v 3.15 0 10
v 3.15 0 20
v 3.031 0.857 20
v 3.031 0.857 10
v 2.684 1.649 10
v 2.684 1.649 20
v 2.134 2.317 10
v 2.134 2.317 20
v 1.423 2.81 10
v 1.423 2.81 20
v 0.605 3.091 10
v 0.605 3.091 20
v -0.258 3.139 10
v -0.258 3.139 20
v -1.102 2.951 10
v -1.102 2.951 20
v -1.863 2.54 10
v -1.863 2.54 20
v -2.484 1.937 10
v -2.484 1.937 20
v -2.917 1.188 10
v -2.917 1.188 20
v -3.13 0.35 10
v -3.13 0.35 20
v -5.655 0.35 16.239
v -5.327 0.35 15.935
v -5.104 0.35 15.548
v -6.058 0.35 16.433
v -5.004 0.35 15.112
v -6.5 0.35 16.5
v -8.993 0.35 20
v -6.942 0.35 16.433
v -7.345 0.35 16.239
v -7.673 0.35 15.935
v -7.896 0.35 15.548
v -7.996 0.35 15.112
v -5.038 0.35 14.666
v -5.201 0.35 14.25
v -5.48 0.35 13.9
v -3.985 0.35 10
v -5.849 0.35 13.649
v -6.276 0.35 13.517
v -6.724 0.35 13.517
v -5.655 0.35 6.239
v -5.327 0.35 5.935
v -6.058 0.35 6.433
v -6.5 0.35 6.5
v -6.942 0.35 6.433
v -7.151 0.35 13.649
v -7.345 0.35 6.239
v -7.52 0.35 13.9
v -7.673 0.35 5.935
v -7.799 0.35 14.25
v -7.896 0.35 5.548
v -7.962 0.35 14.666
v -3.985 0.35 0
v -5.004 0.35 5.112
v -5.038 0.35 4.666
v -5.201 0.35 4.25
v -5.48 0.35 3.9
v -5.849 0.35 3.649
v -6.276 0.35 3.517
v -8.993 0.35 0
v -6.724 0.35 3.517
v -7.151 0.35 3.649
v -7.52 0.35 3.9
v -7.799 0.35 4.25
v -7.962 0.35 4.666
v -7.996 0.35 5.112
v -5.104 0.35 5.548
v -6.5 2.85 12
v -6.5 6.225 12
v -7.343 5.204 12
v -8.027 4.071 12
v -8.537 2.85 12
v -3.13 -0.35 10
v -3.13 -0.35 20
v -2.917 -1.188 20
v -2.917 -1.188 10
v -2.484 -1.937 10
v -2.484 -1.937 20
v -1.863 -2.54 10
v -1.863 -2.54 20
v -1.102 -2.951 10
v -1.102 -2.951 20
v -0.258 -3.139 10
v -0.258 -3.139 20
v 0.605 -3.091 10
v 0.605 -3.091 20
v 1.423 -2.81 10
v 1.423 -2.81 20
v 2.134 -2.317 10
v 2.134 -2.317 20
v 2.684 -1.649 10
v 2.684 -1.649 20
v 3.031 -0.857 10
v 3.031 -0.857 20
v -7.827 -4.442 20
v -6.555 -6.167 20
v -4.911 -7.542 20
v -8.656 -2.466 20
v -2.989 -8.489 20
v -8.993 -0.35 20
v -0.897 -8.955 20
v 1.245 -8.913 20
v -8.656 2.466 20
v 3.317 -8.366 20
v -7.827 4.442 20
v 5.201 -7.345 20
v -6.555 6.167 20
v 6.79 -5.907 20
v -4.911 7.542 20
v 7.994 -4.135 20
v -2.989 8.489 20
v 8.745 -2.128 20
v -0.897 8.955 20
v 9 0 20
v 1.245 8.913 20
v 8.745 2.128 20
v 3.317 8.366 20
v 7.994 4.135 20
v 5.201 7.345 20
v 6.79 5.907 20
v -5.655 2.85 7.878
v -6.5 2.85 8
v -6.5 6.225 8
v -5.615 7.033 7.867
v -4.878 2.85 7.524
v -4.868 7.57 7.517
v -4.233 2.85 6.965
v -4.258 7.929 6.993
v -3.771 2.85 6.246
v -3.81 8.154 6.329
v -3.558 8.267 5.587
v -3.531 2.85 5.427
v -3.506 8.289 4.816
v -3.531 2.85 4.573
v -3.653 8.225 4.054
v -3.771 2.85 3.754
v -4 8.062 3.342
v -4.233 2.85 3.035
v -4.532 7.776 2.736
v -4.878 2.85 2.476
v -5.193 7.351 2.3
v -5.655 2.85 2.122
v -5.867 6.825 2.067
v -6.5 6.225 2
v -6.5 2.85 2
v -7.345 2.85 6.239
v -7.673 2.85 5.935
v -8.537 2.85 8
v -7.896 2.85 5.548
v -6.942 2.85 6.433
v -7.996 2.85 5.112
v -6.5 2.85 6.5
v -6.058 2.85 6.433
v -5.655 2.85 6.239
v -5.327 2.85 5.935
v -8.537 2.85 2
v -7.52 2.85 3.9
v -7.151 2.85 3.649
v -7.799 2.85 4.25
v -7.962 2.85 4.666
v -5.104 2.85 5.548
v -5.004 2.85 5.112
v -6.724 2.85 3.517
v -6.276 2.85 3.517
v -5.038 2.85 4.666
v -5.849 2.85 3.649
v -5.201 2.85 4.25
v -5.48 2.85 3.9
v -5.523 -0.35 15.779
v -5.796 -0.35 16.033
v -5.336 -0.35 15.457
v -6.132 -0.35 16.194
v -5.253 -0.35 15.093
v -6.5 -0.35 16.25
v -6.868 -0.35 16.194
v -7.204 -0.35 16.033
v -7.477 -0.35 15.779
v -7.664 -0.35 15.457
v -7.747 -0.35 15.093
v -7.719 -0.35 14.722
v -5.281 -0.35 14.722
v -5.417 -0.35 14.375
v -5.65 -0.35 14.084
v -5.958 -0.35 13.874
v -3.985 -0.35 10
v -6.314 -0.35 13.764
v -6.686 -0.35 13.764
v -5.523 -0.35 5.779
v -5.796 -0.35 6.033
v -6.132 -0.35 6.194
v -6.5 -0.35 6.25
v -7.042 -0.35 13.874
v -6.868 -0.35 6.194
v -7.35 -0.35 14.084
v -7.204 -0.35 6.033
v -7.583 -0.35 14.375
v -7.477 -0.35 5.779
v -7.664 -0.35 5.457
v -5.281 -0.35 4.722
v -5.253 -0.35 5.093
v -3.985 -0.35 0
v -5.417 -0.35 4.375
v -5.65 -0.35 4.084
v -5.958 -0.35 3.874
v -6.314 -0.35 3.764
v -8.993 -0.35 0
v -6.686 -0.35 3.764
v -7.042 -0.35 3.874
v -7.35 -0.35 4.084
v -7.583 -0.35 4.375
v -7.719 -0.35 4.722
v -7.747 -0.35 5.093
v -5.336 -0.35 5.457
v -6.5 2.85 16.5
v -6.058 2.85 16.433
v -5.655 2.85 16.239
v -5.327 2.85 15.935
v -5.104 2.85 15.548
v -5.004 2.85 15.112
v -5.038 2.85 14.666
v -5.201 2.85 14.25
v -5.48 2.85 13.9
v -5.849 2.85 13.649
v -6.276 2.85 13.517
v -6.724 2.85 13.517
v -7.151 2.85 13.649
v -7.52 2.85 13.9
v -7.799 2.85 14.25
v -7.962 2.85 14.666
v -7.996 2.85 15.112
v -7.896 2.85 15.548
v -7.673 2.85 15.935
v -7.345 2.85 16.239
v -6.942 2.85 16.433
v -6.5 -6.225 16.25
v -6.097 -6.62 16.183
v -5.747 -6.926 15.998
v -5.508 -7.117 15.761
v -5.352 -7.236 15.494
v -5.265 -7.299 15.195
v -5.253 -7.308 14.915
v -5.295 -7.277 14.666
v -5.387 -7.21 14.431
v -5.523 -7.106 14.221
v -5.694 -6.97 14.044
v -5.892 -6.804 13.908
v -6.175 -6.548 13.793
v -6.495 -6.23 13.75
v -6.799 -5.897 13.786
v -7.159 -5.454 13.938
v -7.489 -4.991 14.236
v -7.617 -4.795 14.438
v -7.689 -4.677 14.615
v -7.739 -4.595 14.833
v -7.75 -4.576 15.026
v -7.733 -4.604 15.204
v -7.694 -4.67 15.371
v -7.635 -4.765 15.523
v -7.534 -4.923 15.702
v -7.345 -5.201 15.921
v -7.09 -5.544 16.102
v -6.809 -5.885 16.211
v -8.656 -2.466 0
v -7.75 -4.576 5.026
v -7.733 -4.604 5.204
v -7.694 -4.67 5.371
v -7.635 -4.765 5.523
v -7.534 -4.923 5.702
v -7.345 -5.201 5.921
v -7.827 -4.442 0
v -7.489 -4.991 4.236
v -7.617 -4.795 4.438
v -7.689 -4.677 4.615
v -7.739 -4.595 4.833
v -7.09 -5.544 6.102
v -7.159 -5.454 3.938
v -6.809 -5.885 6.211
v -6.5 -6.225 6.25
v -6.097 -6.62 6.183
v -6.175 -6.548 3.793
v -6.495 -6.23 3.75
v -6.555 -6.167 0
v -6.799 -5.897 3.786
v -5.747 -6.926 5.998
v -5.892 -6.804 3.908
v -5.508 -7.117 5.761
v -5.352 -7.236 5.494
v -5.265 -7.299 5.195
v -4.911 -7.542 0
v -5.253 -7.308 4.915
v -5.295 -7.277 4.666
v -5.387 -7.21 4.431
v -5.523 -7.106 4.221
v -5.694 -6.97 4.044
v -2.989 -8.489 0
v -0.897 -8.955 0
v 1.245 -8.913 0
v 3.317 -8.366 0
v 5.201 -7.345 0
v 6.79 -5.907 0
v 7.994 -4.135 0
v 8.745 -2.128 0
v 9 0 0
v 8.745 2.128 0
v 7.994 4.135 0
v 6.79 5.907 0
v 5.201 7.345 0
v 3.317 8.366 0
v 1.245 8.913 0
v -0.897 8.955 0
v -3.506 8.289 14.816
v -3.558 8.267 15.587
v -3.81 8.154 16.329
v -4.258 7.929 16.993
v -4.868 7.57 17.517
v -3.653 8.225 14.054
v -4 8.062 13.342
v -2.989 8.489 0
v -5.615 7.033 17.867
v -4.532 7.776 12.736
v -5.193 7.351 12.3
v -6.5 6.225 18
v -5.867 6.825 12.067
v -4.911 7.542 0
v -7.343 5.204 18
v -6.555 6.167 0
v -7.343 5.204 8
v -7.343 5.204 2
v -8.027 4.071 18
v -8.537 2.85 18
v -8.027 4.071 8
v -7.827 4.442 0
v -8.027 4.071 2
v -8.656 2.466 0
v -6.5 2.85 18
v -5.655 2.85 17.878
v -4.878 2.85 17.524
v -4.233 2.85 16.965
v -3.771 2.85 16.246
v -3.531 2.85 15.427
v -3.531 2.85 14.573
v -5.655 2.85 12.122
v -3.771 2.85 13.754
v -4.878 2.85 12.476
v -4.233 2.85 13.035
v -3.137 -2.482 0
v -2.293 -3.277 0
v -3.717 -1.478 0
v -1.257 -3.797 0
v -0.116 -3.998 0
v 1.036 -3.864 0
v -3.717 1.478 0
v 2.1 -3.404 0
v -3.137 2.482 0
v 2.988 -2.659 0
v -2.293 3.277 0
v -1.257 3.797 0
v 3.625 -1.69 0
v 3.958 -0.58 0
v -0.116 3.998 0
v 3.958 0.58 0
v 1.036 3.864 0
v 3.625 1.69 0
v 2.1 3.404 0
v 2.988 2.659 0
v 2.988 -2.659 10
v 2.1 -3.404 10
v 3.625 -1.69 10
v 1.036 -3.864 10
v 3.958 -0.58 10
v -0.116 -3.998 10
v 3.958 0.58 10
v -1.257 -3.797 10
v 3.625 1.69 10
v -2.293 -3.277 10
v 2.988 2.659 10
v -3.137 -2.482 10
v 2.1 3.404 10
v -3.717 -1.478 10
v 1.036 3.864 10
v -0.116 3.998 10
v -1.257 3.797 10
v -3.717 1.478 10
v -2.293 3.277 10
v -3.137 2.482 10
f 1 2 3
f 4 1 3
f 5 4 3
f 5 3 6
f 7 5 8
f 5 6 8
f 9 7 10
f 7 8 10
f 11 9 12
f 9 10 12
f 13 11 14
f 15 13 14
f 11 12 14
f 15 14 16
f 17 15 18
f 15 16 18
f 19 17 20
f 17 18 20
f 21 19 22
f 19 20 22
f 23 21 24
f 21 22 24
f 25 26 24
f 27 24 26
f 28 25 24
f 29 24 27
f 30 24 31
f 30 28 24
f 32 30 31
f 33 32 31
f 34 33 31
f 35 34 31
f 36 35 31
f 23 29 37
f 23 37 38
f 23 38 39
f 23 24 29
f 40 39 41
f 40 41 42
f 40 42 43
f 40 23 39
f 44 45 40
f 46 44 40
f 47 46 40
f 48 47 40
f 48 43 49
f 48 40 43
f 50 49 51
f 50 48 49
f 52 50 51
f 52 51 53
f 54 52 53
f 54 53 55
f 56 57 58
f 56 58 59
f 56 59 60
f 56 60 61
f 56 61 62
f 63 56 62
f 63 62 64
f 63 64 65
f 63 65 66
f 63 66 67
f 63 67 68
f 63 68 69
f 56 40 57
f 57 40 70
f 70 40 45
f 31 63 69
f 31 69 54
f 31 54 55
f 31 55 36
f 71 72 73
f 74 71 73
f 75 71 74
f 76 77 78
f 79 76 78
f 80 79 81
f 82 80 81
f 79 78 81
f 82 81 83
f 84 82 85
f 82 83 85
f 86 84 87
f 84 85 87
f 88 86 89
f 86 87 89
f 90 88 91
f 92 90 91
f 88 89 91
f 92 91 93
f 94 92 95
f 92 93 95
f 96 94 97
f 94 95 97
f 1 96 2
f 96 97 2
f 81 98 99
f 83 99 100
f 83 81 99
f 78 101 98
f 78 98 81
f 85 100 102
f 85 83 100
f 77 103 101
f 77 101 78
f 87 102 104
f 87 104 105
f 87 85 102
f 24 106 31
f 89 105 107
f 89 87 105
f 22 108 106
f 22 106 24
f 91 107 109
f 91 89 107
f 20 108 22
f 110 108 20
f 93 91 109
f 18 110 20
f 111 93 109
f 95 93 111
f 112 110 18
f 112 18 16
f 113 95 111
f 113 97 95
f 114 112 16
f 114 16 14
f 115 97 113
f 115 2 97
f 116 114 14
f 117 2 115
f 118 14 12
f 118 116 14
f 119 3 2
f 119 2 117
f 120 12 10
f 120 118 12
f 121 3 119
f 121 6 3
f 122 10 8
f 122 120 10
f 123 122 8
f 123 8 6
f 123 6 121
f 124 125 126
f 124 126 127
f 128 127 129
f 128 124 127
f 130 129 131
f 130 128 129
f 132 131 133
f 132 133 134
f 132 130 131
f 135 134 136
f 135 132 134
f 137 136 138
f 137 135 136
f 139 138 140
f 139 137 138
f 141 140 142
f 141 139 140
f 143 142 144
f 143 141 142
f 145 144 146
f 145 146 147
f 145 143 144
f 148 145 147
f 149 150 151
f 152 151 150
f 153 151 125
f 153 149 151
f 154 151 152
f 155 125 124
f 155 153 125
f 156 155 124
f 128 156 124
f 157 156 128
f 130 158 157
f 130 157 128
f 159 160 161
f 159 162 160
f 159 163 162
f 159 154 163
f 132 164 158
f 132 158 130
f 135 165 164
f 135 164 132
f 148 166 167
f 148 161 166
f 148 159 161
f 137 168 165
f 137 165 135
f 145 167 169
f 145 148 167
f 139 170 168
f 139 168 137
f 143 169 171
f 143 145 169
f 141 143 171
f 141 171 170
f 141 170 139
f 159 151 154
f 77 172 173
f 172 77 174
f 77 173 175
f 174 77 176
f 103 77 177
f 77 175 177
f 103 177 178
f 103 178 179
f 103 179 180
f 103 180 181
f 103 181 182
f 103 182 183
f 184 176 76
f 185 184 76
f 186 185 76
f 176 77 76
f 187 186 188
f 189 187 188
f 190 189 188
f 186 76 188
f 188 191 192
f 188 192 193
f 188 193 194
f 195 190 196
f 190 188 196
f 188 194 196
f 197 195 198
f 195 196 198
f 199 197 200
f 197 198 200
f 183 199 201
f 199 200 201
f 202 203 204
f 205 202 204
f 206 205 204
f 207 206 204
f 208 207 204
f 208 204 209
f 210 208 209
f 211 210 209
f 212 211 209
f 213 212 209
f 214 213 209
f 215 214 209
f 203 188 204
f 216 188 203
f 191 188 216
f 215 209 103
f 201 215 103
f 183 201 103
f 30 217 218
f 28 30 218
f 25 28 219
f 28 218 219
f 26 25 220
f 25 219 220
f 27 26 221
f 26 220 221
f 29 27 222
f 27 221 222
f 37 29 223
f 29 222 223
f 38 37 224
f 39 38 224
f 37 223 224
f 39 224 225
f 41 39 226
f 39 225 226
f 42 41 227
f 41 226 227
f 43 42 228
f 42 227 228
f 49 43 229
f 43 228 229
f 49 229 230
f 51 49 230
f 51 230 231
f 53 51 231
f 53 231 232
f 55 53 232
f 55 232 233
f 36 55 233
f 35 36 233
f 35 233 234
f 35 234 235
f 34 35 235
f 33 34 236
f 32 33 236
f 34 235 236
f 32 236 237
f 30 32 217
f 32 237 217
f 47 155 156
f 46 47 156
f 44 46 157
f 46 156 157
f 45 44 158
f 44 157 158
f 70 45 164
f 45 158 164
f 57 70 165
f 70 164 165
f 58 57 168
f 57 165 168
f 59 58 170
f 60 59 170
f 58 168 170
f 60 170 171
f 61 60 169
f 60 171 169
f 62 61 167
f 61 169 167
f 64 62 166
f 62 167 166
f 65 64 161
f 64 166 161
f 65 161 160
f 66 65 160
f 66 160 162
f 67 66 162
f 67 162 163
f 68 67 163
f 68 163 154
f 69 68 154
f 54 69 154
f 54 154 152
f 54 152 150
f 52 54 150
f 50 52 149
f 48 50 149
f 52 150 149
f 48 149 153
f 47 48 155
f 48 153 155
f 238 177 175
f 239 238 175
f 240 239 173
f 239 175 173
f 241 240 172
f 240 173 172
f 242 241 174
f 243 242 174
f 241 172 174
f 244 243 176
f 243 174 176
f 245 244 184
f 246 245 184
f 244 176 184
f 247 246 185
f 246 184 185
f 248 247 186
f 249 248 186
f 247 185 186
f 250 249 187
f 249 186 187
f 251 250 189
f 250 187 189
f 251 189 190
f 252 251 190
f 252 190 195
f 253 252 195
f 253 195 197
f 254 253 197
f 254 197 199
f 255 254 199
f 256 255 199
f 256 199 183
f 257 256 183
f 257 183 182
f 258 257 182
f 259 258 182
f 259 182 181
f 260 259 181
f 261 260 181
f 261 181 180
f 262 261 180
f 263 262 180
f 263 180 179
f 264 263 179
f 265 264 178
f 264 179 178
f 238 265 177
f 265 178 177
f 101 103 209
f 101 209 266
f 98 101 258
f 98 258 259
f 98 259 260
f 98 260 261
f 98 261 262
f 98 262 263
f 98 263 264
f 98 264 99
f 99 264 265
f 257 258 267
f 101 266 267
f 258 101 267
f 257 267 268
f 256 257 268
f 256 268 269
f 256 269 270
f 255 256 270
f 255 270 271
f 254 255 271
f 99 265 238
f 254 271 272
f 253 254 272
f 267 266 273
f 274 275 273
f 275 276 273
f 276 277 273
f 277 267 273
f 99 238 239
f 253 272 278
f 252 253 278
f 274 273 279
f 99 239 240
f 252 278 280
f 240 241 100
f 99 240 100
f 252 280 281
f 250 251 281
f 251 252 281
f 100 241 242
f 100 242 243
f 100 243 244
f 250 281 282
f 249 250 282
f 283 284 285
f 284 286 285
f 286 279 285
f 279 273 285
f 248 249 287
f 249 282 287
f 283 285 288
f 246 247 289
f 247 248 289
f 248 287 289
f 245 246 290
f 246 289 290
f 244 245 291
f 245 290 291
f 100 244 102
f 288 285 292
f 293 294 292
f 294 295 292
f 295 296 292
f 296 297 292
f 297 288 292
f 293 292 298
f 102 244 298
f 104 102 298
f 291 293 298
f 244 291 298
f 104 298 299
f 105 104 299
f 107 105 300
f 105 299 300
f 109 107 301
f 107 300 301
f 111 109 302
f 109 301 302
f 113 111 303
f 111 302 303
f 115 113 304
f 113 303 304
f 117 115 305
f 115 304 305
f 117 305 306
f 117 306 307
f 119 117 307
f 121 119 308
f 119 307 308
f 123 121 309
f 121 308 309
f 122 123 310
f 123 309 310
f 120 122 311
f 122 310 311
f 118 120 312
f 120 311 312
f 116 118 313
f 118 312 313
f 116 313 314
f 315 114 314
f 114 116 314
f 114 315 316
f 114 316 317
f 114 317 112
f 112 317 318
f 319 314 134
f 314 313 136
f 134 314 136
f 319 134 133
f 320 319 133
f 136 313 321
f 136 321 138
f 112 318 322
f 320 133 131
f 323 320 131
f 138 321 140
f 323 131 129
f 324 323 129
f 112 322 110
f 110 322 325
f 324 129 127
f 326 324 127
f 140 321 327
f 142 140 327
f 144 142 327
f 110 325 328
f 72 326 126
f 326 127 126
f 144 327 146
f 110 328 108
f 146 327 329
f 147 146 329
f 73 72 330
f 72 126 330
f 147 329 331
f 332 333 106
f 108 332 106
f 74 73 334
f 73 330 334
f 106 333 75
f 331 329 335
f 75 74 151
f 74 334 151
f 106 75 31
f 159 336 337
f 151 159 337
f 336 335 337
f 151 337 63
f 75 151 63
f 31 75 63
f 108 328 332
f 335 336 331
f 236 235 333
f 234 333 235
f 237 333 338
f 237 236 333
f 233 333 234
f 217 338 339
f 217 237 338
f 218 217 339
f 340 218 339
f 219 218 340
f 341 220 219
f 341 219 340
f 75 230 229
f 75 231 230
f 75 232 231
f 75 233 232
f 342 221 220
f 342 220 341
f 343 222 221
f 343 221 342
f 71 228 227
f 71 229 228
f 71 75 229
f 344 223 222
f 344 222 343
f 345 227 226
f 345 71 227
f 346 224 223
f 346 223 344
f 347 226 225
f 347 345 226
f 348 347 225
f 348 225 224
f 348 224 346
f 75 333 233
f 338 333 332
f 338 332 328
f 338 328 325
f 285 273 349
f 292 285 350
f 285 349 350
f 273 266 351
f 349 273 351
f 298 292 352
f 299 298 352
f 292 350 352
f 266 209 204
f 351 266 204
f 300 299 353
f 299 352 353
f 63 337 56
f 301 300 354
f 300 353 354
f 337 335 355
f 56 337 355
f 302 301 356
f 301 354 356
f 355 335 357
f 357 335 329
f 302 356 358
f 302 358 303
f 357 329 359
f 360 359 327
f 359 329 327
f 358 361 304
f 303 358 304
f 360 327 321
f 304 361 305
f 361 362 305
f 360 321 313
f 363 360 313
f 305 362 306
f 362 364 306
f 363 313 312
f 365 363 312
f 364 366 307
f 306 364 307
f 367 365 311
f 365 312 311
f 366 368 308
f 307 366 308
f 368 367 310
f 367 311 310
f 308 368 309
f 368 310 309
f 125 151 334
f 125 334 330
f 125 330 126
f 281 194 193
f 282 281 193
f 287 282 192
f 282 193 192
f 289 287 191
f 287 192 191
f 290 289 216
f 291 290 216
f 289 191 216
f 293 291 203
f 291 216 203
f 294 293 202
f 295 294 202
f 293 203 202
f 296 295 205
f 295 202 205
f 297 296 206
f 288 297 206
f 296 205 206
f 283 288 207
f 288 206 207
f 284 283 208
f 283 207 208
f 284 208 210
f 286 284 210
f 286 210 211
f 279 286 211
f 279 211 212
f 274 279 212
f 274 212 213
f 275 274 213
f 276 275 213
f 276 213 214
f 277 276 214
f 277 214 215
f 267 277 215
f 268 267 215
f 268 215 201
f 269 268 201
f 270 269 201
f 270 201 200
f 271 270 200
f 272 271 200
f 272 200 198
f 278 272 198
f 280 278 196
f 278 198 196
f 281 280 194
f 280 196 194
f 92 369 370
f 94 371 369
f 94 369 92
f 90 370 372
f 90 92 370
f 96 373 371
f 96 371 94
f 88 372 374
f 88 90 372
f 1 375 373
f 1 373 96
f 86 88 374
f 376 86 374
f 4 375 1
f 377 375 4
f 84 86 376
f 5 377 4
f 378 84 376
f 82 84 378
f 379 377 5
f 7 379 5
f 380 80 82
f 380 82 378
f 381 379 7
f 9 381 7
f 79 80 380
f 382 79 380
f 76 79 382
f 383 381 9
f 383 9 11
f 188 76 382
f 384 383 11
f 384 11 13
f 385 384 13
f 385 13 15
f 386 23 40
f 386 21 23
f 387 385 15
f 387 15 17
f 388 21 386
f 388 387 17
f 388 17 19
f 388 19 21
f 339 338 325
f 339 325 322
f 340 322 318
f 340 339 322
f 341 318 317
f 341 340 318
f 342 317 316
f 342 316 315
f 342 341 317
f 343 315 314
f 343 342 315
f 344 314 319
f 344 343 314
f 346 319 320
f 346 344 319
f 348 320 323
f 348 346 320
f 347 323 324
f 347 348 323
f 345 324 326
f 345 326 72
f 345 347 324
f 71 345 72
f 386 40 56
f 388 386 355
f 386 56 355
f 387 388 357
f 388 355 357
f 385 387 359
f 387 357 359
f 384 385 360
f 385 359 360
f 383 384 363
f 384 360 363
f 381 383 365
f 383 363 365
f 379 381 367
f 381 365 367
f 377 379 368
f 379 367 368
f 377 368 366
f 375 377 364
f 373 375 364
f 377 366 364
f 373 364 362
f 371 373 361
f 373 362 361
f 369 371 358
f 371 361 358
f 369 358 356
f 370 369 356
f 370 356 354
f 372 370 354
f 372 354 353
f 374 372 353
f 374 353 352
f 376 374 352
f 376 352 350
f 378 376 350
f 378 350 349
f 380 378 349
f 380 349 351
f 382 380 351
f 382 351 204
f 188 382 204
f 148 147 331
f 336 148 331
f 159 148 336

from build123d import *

# Parameters (mm, degrees)
SKETCH_1_R          = 9
EXTRUDE_1_DEPTH     = 20
SKETCH_2_R          = 3.15
CUT_EXTRUDE_1_DEPTH = 24.706539182
SKETCH_3_R          = 4
CUT_EXTRUDE_2_DEPTH = 10
SKETCH_4_W          = 11.134080052
SKETCH_4_H          = 0.7
CUT_EXTRUDE_3_DEPTH = 24.706539182
CUT_EXTRUDE_4_DEPTH = 25.928347318
SKETCH_6_R          = 1.5
CUT_EXTRUDE_5_DEPTH = 2.5
SKETCH_7_R          = 1.25
CUT_EXTRUDE_6_DEPTH = 24.841612942


with BuildPart() as part:
    # Эскиз1 → Бобышка-Вытянуть1 (new body)
    with BuildSketch(Plane.XY):
        Circle(SKETCH_1_R)
    extrude(amount=EXTRUDE_1_DEPTH)

    # Эскиз2 → Вырез-Вытянуть1 (cut, through all)
    with BuildSketch(Plane.XY.offset(20)):
        Circle(SKETCH_2_R)
    extrude(amount=-CUT_EXTRUDE_1_DEPTH, mode=Mode.SUBTRACT)

    # Эскиз3 → Вырез-Вытянуть2 (cut)
    with BuildSketch(Plane(origin=(0, 0, 0), x_dir=(-1, 0, 0), z_dir=(0, 0, -1))):
        Circle(SKETCH_3_R)
    extrude(amount=-CUT_EXTRUDE_2_DEPTH, mode=Mode.SUBTRACT)

    # Эскиз4 → Вырез-Вытянуть3 (cut, through all)
    with BuildSketch(Plane(origin=(0, 0, 0), x_dir=(-1, 0, 0), z_dir=(0, 0, -1))):
        with Locations((7.860965997, 0)):
            Rectangle(SKETCH_4_W, SKETCH_4_H)
    extrude(amount=-CUT_EXTRUDE_3_DEPTH, mode=Mode.SUBTRACT)

    # Эскиз5 → Вырез-Вытянуть4 (cut, through all)
    with BuildSketch(Plane(origin=(0, 2.85, 0), x_dir=(-1, 0, 0), z_dir=(0, -1, 0))):
        with BuildLine():
            Line((6.5, -2), (11.780255313, -2))
            Line((11.780255313, -2), (11.780255313, -8))
            Line((11.780255313, -8), (6.5, -8))
            ThreePointArc((6.5, -8), (3.5, -5), (6.5, -2))
        make_face()
        with BuildLine():
            Line((6.5, -12), (11.780255313, -12))
            Line((11.780255313, -12), (11.780255313, -18))
            Line((11.780255313, -18), (6.5, -18))
            ThreePointArc((6.5, -18), (3.5, -15), (6.5, -12))
        make_face()
    extrude(amount=-CUT_EXTRUDE_4_DEPTH, mode=Mode.SUBTRACT)

    # Эскиз6 → Вырез-Вытянуть5 (cut)
    with BuildSketch(Plane(origin=(0, 2.85, 0), x_dir=(1, 0, 0), z_dir=(0, 1, 0))):
        with Locations(Location((-6.5, -5, 0), (0, 0, 270))):
            Circle(SKETCH_6_R)
        with Locations(Location((-6.5, -15, 0), (0, 0, 270))):
            Circle(SKETCH_6_R)
    extrude(amount=-CUT_EXTRUDE_5_DEPTH, mode=Mode.SUBTRACT)

    # Эскиз7 → Вырез-Вытянуть6 (cut, through all)
    with BuildSketch(Plane(origin=(0, -0.35, 0), x_dir=(1, 0, 0), z_dir=(0, 1, 0))):
        with Locations(Location((-6.5, -5, 0), (0, 0, 270))):
            Circle(SKETCH_7_R)
        with Locations(Location((-6.5, -15, 0), (0, 0, 270))):
            Circle(SKETCH_7_R)
    extrude(amount=-CUT_EXTRUDE_6_DEPTH, mode=Mode.SUBTRACT)


solid = part.part
